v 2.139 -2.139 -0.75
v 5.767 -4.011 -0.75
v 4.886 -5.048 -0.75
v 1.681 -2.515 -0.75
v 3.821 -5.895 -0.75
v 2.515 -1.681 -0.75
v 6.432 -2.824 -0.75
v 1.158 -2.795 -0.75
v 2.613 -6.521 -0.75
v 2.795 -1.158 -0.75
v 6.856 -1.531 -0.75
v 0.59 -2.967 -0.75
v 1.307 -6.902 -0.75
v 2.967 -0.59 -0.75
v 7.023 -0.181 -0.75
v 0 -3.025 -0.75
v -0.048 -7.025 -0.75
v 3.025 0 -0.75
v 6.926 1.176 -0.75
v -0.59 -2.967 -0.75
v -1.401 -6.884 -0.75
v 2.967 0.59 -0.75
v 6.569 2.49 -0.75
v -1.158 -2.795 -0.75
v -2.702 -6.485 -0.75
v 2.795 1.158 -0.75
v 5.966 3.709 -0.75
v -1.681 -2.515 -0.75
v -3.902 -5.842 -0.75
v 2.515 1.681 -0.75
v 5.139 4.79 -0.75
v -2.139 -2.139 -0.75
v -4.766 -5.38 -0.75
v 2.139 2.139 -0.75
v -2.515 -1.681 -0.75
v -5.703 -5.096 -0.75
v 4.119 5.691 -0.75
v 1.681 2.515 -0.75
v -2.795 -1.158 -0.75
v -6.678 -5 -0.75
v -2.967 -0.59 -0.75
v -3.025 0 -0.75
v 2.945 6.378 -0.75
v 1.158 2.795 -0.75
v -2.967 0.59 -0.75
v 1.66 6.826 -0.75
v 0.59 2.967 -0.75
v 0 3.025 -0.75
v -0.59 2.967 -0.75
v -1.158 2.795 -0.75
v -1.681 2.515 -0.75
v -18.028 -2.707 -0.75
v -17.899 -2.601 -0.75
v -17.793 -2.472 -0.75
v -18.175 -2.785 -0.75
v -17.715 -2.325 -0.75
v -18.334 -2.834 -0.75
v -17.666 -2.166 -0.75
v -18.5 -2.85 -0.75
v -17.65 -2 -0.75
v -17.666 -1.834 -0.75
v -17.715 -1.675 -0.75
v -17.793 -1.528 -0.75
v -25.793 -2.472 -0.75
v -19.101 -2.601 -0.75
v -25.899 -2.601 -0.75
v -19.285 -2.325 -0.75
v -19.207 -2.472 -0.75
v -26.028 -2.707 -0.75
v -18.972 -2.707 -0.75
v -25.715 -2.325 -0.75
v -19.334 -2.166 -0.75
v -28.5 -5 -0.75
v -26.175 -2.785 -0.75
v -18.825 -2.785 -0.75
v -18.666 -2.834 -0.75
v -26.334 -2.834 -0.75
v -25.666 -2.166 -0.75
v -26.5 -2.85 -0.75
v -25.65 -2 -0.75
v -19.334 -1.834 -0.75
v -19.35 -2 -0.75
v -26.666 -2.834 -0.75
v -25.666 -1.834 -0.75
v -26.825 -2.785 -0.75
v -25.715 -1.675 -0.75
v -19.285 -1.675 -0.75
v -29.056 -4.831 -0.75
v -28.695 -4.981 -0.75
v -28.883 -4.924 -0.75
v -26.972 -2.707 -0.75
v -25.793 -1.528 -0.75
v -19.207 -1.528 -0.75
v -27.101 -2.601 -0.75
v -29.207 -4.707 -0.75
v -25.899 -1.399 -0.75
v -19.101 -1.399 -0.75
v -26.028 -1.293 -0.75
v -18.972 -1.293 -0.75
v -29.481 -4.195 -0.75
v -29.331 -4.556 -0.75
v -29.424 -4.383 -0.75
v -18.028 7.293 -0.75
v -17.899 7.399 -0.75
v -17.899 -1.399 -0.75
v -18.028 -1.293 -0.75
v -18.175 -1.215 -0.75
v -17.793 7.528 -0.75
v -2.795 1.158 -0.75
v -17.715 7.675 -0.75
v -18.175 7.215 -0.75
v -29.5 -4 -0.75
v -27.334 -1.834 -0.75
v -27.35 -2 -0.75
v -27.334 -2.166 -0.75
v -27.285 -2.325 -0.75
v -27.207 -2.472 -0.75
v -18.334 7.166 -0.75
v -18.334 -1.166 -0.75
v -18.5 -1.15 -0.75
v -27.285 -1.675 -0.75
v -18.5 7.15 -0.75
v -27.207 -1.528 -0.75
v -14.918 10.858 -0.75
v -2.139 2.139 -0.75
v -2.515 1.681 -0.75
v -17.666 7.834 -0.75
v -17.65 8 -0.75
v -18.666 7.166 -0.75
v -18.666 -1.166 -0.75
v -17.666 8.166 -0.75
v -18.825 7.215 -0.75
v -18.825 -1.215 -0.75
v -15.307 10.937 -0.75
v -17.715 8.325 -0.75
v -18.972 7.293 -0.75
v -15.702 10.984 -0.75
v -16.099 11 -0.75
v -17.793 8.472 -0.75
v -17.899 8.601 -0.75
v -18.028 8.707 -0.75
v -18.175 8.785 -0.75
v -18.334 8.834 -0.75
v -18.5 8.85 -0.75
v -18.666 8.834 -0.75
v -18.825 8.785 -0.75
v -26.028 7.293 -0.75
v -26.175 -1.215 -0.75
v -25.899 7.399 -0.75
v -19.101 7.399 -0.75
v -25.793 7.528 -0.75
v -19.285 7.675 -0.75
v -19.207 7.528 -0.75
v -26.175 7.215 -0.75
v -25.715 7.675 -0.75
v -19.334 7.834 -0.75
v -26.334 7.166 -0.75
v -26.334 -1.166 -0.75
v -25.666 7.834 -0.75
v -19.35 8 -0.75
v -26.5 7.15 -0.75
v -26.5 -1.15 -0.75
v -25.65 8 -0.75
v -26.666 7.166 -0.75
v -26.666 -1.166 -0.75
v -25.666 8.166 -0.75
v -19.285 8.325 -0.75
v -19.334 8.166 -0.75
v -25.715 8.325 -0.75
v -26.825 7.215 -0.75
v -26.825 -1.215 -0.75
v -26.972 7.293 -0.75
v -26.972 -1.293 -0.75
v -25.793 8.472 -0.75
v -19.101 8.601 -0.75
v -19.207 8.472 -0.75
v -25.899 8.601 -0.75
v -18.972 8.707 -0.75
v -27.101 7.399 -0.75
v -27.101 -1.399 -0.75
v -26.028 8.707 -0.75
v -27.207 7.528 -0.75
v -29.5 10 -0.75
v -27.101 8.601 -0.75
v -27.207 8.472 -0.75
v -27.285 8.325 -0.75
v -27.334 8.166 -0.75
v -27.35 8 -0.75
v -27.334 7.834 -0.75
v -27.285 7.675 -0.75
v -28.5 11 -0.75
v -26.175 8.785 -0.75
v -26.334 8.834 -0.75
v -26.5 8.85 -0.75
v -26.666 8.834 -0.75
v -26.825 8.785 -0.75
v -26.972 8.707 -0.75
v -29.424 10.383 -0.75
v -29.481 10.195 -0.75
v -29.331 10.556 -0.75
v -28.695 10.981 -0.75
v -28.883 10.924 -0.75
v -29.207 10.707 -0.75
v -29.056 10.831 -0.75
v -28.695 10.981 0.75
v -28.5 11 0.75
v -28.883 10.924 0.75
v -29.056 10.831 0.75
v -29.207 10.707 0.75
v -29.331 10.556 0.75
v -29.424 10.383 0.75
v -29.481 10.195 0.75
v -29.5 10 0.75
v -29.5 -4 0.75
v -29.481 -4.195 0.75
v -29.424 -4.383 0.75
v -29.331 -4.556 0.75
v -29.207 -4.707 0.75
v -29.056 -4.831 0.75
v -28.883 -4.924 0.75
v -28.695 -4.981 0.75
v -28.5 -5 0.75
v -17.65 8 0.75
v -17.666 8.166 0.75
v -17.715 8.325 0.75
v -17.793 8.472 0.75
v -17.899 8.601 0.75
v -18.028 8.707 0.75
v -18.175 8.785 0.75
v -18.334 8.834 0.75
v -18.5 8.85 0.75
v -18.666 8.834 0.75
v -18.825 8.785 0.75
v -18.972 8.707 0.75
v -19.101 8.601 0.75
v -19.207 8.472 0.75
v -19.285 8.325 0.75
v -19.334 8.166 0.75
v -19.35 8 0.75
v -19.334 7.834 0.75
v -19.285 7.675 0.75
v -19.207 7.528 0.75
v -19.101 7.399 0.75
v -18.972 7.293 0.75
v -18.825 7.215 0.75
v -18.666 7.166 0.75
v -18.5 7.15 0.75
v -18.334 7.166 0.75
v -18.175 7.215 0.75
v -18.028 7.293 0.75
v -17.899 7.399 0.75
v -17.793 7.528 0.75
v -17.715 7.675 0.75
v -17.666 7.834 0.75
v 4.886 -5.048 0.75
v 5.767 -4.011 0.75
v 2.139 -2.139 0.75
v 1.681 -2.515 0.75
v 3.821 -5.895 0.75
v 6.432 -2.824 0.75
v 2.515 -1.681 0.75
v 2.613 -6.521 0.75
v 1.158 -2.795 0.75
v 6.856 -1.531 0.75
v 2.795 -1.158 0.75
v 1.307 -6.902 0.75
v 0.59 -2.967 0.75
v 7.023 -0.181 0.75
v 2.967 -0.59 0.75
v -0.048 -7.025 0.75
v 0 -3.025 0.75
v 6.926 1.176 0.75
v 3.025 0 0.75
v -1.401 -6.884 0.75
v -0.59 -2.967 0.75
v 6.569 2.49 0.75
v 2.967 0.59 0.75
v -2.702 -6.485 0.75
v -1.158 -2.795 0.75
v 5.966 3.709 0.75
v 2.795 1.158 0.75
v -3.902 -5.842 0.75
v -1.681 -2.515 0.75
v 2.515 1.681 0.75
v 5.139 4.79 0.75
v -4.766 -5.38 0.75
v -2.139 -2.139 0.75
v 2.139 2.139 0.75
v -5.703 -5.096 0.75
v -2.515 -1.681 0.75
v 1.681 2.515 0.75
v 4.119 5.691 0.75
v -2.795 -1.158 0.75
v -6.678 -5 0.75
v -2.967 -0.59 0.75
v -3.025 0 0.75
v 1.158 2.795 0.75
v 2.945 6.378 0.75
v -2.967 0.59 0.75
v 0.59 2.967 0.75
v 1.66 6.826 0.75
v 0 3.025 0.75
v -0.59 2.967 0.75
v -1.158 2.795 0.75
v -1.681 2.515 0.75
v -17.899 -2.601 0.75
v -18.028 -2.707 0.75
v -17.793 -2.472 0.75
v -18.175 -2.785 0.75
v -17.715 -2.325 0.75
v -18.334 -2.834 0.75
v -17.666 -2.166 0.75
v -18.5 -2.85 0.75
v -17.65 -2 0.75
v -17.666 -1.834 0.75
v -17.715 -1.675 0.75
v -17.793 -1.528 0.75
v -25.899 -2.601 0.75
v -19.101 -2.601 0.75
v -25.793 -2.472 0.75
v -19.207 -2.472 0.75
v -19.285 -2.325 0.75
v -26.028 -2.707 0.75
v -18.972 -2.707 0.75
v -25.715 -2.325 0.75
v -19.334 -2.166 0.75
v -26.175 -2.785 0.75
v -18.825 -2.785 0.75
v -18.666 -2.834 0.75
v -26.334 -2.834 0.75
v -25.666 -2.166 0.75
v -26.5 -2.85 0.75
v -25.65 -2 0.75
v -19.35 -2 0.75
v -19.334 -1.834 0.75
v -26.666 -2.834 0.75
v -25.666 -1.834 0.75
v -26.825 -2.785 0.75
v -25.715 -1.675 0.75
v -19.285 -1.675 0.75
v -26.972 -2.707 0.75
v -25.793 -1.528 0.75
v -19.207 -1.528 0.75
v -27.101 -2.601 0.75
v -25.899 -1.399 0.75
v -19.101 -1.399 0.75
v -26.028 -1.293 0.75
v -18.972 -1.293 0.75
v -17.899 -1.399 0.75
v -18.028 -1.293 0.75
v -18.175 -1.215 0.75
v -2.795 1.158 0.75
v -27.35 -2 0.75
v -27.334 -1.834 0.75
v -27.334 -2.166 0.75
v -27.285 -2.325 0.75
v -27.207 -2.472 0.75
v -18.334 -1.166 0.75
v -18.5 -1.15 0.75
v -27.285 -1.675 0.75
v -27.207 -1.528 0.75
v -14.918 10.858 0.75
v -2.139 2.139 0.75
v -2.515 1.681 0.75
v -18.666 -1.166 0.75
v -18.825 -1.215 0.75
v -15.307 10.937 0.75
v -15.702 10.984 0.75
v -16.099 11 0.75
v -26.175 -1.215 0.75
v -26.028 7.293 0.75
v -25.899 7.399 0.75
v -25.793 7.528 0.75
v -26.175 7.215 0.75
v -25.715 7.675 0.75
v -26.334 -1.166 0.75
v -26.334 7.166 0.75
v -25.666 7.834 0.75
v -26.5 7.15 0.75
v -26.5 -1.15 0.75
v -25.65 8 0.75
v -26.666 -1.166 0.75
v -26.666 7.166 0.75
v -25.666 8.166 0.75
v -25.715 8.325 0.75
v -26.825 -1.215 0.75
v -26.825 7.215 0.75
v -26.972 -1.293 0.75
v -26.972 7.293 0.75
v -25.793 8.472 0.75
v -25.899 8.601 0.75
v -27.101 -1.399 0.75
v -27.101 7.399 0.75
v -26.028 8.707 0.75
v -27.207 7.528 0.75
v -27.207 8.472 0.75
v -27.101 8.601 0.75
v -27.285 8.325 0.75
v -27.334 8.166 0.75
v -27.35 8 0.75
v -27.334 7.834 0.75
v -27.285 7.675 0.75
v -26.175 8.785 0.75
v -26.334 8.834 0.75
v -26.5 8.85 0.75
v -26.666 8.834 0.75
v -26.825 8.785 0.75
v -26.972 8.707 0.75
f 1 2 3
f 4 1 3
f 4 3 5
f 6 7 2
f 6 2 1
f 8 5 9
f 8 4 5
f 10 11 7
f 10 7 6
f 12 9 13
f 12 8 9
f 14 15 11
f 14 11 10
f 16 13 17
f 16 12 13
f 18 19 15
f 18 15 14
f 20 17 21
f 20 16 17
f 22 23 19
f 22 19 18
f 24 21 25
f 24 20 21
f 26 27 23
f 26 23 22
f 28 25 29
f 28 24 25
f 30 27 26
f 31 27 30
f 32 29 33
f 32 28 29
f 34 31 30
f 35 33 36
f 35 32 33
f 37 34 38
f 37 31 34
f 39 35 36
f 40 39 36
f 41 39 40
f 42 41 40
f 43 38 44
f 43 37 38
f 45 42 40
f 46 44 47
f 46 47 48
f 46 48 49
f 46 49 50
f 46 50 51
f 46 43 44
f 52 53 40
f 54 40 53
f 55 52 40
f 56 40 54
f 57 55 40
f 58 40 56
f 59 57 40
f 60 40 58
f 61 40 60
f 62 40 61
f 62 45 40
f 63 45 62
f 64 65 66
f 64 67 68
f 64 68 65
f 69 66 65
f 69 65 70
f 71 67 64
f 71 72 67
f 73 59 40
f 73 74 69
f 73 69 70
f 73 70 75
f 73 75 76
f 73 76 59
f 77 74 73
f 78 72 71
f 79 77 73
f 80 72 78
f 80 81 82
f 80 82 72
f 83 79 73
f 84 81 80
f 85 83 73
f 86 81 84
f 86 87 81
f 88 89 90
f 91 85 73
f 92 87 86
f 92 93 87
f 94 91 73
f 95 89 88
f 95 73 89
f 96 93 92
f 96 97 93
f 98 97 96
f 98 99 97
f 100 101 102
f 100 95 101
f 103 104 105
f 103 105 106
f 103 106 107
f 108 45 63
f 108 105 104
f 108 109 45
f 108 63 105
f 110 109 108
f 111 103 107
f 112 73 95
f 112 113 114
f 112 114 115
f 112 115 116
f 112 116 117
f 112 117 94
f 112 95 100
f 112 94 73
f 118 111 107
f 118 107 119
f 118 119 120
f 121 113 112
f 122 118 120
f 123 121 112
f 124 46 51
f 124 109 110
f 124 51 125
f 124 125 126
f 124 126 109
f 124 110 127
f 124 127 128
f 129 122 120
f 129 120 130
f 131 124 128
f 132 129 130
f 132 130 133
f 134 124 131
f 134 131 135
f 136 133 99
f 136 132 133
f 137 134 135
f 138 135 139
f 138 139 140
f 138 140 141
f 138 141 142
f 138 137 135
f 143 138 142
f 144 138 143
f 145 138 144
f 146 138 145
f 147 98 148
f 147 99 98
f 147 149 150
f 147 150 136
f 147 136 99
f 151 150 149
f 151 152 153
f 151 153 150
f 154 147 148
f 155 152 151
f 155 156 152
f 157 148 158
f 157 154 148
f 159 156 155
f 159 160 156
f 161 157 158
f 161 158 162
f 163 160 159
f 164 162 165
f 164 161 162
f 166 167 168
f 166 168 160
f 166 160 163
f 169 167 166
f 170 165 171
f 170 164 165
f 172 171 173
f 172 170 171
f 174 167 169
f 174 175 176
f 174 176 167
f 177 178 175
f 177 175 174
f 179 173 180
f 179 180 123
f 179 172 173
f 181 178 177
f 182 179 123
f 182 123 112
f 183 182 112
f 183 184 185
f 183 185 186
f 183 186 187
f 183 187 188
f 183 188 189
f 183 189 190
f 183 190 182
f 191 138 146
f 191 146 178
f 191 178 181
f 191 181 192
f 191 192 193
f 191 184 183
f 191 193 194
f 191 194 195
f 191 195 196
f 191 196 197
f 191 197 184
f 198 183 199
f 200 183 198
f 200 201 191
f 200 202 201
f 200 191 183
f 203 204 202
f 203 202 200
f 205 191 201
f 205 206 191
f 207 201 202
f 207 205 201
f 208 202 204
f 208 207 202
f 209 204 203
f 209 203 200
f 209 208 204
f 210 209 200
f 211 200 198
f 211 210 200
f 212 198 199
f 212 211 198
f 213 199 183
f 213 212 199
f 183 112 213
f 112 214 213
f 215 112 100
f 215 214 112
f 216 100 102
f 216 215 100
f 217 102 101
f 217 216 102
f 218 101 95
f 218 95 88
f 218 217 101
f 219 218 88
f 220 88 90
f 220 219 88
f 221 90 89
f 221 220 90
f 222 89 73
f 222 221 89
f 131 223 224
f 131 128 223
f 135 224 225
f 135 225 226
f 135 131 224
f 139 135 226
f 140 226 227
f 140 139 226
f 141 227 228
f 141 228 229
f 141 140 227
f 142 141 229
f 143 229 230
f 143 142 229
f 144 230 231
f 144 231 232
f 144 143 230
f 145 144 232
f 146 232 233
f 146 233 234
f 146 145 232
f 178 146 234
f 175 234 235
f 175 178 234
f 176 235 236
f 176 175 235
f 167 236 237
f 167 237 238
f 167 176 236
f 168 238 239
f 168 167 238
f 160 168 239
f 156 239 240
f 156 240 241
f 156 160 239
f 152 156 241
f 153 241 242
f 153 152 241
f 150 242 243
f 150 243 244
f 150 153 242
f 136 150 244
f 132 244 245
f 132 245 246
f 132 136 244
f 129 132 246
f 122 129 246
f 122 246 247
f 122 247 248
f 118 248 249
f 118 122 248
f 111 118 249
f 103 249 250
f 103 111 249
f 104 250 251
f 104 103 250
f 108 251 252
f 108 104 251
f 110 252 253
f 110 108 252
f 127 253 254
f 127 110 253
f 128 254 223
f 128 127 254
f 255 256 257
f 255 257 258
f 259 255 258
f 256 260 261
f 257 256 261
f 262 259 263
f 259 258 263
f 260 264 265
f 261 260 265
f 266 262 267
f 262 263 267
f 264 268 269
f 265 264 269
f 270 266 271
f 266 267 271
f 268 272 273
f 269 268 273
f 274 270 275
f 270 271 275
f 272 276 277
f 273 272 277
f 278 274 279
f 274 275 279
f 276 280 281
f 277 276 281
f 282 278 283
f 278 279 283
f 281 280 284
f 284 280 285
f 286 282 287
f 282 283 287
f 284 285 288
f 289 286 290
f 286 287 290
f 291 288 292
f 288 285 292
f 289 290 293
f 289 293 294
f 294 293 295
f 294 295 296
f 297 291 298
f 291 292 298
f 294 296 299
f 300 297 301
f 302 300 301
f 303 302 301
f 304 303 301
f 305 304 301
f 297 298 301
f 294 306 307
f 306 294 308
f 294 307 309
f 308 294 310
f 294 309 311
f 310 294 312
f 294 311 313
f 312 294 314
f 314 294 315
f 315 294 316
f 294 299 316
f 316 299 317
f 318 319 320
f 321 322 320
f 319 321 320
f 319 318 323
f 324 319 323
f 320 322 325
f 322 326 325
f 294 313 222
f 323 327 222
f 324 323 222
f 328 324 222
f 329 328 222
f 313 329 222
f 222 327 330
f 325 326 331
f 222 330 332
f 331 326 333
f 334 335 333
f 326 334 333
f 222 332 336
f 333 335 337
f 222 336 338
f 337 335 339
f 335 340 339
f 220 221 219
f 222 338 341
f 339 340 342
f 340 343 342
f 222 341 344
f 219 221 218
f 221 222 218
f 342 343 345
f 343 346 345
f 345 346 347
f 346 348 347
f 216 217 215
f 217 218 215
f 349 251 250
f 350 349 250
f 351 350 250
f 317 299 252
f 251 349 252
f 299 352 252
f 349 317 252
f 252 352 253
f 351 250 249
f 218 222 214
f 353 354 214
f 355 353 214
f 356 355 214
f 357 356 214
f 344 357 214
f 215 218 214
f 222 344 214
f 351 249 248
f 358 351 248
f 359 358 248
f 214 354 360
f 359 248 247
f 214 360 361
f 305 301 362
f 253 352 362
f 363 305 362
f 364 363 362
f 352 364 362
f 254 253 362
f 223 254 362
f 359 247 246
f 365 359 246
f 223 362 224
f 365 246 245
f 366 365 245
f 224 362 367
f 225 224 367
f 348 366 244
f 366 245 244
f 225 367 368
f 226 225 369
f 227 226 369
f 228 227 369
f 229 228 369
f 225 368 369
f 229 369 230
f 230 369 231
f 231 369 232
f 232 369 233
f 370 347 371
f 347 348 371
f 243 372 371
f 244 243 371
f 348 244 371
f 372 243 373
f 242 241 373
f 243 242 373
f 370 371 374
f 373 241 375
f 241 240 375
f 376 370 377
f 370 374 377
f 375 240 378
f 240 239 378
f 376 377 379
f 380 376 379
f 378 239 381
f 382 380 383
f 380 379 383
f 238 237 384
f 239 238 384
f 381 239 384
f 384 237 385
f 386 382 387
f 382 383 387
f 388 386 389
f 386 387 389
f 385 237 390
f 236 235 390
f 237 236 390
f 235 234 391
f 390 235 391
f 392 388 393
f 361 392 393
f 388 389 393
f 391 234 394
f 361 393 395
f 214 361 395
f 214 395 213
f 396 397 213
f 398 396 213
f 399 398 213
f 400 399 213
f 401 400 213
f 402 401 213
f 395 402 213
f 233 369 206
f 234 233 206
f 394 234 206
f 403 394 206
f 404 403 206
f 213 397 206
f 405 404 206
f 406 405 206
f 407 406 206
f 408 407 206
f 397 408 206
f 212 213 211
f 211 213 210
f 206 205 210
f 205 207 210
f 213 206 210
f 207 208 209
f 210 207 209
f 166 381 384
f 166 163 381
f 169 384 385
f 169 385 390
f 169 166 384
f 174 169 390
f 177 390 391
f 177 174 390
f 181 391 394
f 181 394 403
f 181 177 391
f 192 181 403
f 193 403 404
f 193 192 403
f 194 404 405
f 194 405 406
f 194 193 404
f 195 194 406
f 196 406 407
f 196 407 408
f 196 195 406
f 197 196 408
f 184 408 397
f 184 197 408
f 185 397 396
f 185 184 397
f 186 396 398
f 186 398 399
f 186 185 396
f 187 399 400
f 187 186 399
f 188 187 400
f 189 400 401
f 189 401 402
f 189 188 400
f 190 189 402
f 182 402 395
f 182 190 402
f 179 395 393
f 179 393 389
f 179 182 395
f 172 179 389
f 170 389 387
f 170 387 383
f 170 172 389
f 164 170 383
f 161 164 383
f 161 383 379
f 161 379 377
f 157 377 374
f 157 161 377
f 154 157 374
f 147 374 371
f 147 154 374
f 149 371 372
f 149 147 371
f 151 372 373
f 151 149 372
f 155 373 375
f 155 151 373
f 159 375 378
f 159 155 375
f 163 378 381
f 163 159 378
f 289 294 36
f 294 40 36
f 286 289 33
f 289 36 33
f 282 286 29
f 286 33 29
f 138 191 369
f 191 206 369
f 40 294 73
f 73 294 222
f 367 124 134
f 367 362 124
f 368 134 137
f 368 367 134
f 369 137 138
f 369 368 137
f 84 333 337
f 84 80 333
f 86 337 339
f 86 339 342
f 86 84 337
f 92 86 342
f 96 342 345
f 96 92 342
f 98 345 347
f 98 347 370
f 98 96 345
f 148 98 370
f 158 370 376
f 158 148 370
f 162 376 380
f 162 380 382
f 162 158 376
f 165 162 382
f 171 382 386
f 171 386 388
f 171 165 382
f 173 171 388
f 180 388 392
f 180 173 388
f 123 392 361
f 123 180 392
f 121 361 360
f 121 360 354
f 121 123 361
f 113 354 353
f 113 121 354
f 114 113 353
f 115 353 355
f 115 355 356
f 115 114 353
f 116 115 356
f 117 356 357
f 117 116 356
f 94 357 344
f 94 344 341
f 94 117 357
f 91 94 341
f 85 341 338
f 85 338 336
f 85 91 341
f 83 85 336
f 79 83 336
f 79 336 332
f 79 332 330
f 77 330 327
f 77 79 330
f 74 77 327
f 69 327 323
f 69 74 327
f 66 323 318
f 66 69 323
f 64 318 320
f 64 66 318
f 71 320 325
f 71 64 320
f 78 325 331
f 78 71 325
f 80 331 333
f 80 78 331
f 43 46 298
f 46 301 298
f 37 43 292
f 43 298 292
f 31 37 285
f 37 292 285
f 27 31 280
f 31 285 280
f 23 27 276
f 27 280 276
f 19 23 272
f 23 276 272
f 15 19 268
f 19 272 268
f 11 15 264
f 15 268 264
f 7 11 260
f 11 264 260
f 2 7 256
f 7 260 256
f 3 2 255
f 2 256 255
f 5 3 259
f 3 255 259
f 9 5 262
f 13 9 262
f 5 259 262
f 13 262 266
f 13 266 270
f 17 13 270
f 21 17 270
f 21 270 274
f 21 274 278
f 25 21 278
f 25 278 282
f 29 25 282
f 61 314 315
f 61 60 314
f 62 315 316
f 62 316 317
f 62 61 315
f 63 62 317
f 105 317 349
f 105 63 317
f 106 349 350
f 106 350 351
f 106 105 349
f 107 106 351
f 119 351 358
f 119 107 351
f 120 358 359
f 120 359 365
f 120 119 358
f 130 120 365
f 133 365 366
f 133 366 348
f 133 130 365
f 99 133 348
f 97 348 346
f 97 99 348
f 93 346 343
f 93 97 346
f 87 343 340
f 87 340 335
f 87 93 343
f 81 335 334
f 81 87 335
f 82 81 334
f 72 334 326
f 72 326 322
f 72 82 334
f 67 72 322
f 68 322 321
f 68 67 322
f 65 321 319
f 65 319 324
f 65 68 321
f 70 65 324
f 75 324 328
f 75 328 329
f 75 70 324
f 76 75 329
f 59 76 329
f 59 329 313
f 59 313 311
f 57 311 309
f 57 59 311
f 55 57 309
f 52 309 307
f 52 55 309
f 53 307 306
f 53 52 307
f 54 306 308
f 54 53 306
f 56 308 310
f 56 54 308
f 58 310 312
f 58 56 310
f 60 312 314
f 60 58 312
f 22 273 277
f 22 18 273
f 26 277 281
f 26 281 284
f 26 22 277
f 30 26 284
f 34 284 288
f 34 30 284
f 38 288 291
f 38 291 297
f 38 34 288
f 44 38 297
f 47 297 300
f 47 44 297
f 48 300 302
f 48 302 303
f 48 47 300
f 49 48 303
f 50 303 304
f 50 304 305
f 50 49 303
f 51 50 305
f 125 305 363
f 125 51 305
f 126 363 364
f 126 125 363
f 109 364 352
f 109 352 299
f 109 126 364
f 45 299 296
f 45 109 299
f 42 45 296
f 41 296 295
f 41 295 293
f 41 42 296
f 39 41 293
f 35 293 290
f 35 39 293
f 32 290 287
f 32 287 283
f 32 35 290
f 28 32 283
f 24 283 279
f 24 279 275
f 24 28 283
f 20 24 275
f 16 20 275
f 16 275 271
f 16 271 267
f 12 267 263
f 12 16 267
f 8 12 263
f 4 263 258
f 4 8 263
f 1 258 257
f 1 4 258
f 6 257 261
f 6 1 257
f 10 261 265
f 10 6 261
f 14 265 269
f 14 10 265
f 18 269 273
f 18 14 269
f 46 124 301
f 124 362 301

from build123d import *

# Parameters (mm, degrees)
ESQUISSE1_R        = 3.025
ESQUISSE1_R_2      = 0.85
BOSS_EXTRU_1_DEPTH = 0.75
CONG_1_R           = 5
CONG_2_R           = 1


with BuildPart() as part:
    # Esquisse1 → Boss.-Extru.1 (new body, symmetric)
    with BuildSketch(Plane.XY):
        with BuildLine():
            Line((-15.5, 11), (1.660328935, 6.825974863))
            ThreePointArc((1.660328935, 6.825974863), (6.135445446, -3.421539739), (-4.934635245, -5))
            Line((-4.934635245, -5), (-15.5, -5))
            Line((-15.5, -5), (-29.5, -5))
            Line((-29.5, -5), (-29.5, 11))
            Line((-29.5, 11), (-15.5, 11))
        make_face()
        Circle(ESQUISSE1_R, mode=Mode.SUBTRACT)
        with Locations((-26.5, 8)):
            Circle(ESQUISSE1_R_2, mode=Mode.SUBTRACT)
        with Locations((-18.5, 8)):
            Circle(ESQUISSE1_R_2, mode=Mode.SUBTRACT)
        with Locations((-18.5, -2)):
            Circle(ESQUISSE1_R_2, mode=Mode.SUBTRACT)
        with Locations((-26.5, -2)):
            Circle(ESQUISSE1_R_2, mode=Mode.SUBTRACT)
    extrude(amount=BOSS_EXTRU_1_DEPTH, both=True)

    # Congé1
    cong_1_edges = [part.edges().sort_by_distance(p)[0] for p in [
        (-15.5, 11, 0),
        (-4.934635245, -5, 0),
    ]]
    fillet(cong_1_edges, radius=CONG_1_R)

    # Congé2
    cong_2_edges = [part.edges().sort_by_distance(p)[0] for p in [
        (-29.5, 11, 0),
        (-29.5, -5, 0),
    ]]
    fillet(cong_2_edges, radius=CONG_2_R)


solid = part.part
